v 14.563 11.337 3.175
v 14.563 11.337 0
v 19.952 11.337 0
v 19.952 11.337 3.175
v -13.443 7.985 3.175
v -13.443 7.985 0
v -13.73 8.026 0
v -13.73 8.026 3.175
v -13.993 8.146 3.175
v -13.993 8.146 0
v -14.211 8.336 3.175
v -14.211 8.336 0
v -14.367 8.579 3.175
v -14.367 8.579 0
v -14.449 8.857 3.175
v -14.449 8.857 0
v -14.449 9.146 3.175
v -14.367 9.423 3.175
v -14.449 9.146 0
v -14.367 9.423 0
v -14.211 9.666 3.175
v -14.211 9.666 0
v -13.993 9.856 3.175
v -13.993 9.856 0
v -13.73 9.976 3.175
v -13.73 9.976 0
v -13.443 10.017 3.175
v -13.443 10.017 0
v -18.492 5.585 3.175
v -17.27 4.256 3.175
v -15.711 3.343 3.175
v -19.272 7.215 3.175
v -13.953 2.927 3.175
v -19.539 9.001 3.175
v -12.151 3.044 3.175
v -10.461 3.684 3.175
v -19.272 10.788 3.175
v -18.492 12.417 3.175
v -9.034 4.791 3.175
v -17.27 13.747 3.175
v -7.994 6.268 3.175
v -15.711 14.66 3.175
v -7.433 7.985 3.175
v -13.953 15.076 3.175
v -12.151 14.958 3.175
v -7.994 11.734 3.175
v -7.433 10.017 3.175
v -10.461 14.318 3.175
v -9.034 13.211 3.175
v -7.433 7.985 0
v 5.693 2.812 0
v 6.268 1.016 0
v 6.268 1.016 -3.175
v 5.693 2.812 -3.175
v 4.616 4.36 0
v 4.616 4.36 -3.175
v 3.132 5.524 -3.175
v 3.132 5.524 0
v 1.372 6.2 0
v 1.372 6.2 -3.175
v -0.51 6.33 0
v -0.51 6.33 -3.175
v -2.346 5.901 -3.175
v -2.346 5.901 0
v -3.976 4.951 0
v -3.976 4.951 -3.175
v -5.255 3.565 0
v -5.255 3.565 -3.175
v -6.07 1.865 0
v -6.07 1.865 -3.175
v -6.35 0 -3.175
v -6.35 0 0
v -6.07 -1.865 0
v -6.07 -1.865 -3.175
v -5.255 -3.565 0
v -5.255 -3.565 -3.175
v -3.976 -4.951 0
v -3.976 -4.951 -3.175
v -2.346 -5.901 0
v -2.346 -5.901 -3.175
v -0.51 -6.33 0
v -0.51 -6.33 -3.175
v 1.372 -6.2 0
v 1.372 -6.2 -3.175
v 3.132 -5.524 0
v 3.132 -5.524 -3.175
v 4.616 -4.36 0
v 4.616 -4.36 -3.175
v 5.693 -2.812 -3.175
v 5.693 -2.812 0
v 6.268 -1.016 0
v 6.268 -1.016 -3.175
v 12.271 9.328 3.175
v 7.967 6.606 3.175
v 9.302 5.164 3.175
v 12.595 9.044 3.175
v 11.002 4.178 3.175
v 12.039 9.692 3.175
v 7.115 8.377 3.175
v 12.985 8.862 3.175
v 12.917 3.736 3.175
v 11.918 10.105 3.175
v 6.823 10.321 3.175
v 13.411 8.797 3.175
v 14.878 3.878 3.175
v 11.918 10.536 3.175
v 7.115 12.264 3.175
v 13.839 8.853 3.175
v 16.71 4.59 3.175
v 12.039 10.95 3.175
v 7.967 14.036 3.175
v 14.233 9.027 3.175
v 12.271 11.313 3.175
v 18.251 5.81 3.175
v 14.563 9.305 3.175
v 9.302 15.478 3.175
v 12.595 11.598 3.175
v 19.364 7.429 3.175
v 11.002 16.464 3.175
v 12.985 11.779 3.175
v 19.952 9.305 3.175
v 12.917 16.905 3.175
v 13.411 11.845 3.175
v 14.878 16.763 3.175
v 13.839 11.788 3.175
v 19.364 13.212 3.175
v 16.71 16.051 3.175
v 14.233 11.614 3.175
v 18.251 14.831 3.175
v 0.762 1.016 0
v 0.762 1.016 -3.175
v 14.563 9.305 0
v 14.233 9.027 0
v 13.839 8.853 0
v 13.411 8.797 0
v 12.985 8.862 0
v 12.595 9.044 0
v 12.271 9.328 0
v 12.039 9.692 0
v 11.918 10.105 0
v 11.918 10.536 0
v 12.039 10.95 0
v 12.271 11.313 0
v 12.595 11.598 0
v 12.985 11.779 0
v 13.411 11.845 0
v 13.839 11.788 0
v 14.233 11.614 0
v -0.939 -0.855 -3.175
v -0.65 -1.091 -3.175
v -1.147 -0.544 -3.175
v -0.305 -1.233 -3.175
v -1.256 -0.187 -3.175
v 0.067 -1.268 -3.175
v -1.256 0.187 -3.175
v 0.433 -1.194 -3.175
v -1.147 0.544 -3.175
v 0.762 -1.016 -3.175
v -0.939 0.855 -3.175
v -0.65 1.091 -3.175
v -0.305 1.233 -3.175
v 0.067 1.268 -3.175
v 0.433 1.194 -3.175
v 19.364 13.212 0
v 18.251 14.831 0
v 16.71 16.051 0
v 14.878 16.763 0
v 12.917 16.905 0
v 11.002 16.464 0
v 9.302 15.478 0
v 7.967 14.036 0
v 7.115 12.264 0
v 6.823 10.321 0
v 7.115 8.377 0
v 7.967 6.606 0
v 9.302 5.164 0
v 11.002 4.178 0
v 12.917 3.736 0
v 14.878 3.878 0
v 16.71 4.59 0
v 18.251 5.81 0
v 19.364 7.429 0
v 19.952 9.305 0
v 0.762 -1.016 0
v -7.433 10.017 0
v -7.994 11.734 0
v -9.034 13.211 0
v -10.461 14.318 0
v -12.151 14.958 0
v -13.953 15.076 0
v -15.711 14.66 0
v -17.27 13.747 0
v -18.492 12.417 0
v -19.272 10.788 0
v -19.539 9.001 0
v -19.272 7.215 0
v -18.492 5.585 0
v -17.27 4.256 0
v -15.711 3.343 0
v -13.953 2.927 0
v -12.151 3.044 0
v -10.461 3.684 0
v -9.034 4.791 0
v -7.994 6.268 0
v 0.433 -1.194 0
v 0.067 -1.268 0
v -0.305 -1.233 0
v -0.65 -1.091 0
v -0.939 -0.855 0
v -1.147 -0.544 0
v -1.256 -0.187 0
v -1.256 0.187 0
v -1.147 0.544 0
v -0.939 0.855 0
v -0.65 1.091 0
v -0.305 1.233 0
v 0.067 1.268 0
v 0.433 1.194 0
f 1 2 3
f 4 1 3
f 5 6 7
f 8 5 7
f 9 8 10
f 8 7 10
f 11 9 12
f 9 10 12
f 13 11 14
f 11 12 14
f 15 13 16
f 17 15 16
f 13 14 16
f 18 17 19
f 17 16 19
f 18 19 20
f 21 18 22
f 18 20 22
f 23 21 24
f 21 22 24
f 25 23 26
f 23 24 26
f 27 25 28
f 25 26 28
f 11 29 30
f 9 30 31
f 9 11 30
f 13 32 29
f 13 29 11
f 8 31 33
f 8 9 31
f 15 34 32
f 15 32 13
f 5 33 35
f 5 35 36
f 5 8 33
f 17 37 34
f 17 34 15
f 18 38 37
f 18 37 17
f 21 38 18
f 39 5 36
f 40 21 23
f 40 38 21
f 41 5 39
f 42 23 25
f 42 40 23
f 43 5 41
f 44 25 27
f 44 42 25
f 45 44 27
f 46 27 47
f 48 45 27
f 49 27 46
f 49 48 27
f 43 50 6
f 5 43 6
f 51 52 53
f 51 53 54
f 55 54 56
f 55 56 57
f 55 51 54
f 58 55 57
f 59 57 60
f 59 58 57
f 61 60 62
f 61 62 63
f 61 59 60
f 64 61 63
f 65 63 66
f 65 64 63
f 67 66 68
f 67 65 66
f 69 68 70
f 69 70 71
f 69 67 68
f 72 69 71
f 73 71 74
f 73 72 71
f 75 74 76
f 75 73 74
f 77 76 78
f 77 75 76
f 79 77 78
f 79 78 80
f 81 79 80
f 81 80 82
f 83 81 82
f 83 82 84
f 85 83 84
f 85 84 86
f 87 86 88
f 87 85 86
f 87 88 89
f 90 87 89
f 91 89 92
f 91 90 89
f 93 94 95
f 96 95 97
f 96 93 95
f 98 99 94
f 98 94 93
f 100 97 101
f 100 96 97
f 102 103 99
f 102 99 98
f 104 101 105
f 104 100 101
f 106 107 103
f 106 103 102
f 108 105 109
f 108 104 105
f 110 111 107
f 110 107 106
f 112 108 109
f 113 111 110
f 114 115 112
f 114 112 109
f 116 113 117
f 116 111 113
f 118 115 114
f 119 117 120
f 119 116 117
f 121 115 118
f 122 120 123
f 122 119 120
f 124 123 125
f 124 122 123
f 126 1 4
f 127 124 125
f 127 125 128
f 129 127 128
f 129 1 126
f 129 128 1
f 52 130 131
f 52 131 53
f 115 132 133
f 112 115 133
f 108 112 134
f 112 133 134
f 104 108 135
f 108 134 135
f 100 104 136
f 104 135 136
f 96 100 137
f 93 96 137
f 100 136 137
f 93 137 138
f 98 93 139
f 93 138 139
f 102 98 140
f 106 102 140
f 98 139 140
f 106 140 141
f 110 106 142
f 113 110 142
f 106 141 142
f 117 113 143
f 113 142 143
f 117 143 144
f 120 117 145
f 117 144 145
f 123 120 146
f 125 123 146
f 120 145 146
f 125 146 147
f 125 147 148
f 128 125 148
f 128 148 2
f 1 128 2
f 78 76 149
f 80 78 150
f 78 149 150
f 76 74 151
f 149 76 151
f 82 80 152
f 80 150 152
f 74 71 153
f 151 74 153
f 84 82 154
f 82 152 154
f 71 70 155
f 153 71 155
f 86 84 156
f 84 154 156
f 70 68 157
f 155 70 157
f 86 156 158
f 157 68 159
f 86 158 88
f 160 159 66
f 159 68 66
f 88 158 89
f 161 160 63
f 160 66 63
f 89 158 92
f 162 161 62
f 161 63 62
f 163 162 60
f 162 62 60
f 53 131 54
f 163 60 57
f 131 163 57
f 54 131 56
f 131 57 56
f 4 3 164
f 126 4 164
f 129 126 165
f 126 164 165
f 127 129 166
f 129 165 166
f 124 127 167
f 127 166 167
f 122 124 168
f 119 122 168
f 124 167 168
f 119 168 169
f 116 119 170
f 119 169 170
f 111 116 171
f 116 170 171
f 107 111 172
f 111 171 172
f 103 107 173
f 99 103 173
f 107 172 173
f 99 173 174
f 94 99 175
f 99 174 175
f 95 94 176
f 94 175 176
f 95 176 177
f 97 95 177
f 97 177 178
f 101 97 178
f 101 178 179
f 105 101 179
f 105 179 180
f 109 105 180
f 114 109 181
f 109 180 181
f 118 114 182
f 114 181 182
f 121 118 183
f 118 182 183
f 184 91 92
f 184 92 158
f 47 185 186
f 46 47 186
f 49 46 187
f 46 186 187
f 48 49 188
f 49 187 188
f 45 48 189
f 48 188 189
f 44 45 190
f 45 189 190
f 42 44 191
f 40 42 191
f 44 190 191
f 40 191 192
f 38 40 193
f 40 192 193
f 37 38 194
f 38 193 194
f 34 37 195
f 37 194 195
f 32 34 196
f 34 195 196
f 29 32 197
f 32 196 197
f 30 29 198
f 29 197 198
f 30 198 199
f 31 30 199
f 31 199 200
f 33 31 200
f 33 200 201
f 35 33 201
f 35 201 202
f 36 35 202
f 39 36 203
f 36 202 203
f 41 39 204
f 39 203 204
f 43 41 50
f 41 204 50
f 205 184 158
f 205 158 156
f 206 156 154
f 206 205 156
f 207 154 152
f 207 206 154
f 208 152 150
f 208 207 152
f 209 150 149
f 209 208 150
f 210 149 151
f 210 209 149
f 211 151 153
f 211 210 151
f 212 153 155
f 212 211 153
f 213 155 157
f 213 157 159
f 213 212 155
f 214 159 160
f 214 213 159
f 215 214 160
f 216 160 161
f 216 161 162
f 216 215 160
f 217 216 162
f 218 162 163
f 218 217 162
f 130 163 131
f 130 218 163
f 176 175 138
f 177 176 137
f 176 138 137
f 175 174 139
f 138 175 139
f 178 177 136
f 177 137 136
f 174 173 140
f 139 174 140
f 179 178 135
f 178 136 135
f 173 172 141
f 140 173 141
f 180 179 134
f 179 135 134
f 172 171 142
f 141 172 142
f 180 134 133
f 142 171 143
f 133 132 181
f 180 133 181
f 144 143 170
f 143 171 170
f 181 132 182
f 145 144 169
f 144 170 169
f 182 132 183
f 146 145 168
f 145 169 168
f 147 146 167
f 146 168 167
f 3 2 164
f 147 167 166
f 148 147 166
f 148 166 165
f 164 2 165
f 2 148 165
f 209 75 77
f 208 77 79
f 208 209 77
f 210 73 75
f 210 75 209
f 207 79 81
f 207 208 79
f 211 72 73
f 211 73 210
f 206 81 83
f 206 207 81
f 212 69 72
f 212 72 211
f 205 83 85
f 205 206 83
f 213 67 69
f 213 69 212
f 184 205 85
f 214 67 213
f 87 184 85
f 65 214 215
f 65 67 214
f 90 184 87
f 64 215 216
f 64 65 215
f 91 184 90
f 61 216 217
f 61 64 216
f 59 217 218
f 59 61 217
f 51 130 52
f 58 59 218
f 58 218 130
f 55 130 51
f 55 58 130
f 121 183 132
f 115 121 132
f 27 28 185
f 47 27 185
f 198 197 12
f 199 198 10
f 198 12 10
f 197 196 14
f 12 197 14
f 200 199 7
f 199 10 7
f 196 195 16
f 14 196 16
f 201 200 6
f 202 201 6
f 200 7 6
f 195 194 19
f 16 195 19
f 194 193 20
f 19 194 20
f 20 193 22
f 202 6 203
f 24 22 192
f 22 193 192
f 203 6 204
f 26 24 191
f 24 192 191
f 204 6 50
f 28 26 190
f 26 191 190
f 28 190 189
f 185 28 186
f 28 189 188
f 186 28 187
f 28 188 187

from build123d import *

# Parameters (mm, degrees)
F1_DEPTH = 3.175
F3_DEPTH = 3.175
F5_DEPTH = 3.175


# Not quite as in the source:
# - a length typed as a fraction of an inch, garbled in the dataset ("3 / 203.2 mm" for 3/8 in), is restored


with BuildPart() as f1:
    # F0 (on Top) → F1 (new body)
    with BuildSketch(Plane.XY):
        with BuildLine():
            ThreePointArc((0.762, -1.016), (-1.27, 0), (0.762, 1.016))
            Line((0.762, 1.016), (6.2681930411, 1.016))
            ThreePointArc((6.2681930411, 1.016), (-6.35, 0), (6.2681930411, -1.016))
            Line((6.2681930411, -1.016), (0.762, -1.016))
        make_face()
    extrude(amount=-F1_DEPTH)


with BuildPart() as f3:
    # F2 (on Top) → F3 (new body)
    with BuildSketch(Plane.XY):
        with BuildLine():
            ThreePointArc((14.5629012912, 9.3048050132), (11.9029787586, 10.3208050132), (14.5629012912, 11.3368050132))
            Line((14.5629012912, 11.3368050132), (19.9523569086, 11.3368050132))
            ThreePointArc((19.9523569086, 11.3368050132), (6.8229787586, 10.3208050132), (19.9523569086, 9.3048050132))
            Line((19.9523569086, 9.3048050132), (14.5629012912, 9.3048050132))
        make_face()
    extrude(amount=F3_DEPTH)


with BuildPart() as f5:
    # F4 (on Top) → F5 (new body)
    with BuildSketch(Plane.XY):
        with BuildLine():
            ThreePointArc((-13.4432689647, 7.9851497959), (-14.4592689667, 9.0011497959), (-13.4432689647, 10.0171497959))
            Line((-13.4432689647, 10.0171497959), (-7.4325319071, 10.0171497959))
            ThreePointArc((-7.4325319071, 10.0171497959), (-19.5392689667, 9.0011497959), (-7.4325319071, 7.9851497959))
            Line((-7.4325319071, 7.9851497959), (-13.4432689647, 7.9851497959))
        make_face()
    extrude(amount=F5_DEPTH)


solid = Compound([f1.part, f3.part, f5.part])
